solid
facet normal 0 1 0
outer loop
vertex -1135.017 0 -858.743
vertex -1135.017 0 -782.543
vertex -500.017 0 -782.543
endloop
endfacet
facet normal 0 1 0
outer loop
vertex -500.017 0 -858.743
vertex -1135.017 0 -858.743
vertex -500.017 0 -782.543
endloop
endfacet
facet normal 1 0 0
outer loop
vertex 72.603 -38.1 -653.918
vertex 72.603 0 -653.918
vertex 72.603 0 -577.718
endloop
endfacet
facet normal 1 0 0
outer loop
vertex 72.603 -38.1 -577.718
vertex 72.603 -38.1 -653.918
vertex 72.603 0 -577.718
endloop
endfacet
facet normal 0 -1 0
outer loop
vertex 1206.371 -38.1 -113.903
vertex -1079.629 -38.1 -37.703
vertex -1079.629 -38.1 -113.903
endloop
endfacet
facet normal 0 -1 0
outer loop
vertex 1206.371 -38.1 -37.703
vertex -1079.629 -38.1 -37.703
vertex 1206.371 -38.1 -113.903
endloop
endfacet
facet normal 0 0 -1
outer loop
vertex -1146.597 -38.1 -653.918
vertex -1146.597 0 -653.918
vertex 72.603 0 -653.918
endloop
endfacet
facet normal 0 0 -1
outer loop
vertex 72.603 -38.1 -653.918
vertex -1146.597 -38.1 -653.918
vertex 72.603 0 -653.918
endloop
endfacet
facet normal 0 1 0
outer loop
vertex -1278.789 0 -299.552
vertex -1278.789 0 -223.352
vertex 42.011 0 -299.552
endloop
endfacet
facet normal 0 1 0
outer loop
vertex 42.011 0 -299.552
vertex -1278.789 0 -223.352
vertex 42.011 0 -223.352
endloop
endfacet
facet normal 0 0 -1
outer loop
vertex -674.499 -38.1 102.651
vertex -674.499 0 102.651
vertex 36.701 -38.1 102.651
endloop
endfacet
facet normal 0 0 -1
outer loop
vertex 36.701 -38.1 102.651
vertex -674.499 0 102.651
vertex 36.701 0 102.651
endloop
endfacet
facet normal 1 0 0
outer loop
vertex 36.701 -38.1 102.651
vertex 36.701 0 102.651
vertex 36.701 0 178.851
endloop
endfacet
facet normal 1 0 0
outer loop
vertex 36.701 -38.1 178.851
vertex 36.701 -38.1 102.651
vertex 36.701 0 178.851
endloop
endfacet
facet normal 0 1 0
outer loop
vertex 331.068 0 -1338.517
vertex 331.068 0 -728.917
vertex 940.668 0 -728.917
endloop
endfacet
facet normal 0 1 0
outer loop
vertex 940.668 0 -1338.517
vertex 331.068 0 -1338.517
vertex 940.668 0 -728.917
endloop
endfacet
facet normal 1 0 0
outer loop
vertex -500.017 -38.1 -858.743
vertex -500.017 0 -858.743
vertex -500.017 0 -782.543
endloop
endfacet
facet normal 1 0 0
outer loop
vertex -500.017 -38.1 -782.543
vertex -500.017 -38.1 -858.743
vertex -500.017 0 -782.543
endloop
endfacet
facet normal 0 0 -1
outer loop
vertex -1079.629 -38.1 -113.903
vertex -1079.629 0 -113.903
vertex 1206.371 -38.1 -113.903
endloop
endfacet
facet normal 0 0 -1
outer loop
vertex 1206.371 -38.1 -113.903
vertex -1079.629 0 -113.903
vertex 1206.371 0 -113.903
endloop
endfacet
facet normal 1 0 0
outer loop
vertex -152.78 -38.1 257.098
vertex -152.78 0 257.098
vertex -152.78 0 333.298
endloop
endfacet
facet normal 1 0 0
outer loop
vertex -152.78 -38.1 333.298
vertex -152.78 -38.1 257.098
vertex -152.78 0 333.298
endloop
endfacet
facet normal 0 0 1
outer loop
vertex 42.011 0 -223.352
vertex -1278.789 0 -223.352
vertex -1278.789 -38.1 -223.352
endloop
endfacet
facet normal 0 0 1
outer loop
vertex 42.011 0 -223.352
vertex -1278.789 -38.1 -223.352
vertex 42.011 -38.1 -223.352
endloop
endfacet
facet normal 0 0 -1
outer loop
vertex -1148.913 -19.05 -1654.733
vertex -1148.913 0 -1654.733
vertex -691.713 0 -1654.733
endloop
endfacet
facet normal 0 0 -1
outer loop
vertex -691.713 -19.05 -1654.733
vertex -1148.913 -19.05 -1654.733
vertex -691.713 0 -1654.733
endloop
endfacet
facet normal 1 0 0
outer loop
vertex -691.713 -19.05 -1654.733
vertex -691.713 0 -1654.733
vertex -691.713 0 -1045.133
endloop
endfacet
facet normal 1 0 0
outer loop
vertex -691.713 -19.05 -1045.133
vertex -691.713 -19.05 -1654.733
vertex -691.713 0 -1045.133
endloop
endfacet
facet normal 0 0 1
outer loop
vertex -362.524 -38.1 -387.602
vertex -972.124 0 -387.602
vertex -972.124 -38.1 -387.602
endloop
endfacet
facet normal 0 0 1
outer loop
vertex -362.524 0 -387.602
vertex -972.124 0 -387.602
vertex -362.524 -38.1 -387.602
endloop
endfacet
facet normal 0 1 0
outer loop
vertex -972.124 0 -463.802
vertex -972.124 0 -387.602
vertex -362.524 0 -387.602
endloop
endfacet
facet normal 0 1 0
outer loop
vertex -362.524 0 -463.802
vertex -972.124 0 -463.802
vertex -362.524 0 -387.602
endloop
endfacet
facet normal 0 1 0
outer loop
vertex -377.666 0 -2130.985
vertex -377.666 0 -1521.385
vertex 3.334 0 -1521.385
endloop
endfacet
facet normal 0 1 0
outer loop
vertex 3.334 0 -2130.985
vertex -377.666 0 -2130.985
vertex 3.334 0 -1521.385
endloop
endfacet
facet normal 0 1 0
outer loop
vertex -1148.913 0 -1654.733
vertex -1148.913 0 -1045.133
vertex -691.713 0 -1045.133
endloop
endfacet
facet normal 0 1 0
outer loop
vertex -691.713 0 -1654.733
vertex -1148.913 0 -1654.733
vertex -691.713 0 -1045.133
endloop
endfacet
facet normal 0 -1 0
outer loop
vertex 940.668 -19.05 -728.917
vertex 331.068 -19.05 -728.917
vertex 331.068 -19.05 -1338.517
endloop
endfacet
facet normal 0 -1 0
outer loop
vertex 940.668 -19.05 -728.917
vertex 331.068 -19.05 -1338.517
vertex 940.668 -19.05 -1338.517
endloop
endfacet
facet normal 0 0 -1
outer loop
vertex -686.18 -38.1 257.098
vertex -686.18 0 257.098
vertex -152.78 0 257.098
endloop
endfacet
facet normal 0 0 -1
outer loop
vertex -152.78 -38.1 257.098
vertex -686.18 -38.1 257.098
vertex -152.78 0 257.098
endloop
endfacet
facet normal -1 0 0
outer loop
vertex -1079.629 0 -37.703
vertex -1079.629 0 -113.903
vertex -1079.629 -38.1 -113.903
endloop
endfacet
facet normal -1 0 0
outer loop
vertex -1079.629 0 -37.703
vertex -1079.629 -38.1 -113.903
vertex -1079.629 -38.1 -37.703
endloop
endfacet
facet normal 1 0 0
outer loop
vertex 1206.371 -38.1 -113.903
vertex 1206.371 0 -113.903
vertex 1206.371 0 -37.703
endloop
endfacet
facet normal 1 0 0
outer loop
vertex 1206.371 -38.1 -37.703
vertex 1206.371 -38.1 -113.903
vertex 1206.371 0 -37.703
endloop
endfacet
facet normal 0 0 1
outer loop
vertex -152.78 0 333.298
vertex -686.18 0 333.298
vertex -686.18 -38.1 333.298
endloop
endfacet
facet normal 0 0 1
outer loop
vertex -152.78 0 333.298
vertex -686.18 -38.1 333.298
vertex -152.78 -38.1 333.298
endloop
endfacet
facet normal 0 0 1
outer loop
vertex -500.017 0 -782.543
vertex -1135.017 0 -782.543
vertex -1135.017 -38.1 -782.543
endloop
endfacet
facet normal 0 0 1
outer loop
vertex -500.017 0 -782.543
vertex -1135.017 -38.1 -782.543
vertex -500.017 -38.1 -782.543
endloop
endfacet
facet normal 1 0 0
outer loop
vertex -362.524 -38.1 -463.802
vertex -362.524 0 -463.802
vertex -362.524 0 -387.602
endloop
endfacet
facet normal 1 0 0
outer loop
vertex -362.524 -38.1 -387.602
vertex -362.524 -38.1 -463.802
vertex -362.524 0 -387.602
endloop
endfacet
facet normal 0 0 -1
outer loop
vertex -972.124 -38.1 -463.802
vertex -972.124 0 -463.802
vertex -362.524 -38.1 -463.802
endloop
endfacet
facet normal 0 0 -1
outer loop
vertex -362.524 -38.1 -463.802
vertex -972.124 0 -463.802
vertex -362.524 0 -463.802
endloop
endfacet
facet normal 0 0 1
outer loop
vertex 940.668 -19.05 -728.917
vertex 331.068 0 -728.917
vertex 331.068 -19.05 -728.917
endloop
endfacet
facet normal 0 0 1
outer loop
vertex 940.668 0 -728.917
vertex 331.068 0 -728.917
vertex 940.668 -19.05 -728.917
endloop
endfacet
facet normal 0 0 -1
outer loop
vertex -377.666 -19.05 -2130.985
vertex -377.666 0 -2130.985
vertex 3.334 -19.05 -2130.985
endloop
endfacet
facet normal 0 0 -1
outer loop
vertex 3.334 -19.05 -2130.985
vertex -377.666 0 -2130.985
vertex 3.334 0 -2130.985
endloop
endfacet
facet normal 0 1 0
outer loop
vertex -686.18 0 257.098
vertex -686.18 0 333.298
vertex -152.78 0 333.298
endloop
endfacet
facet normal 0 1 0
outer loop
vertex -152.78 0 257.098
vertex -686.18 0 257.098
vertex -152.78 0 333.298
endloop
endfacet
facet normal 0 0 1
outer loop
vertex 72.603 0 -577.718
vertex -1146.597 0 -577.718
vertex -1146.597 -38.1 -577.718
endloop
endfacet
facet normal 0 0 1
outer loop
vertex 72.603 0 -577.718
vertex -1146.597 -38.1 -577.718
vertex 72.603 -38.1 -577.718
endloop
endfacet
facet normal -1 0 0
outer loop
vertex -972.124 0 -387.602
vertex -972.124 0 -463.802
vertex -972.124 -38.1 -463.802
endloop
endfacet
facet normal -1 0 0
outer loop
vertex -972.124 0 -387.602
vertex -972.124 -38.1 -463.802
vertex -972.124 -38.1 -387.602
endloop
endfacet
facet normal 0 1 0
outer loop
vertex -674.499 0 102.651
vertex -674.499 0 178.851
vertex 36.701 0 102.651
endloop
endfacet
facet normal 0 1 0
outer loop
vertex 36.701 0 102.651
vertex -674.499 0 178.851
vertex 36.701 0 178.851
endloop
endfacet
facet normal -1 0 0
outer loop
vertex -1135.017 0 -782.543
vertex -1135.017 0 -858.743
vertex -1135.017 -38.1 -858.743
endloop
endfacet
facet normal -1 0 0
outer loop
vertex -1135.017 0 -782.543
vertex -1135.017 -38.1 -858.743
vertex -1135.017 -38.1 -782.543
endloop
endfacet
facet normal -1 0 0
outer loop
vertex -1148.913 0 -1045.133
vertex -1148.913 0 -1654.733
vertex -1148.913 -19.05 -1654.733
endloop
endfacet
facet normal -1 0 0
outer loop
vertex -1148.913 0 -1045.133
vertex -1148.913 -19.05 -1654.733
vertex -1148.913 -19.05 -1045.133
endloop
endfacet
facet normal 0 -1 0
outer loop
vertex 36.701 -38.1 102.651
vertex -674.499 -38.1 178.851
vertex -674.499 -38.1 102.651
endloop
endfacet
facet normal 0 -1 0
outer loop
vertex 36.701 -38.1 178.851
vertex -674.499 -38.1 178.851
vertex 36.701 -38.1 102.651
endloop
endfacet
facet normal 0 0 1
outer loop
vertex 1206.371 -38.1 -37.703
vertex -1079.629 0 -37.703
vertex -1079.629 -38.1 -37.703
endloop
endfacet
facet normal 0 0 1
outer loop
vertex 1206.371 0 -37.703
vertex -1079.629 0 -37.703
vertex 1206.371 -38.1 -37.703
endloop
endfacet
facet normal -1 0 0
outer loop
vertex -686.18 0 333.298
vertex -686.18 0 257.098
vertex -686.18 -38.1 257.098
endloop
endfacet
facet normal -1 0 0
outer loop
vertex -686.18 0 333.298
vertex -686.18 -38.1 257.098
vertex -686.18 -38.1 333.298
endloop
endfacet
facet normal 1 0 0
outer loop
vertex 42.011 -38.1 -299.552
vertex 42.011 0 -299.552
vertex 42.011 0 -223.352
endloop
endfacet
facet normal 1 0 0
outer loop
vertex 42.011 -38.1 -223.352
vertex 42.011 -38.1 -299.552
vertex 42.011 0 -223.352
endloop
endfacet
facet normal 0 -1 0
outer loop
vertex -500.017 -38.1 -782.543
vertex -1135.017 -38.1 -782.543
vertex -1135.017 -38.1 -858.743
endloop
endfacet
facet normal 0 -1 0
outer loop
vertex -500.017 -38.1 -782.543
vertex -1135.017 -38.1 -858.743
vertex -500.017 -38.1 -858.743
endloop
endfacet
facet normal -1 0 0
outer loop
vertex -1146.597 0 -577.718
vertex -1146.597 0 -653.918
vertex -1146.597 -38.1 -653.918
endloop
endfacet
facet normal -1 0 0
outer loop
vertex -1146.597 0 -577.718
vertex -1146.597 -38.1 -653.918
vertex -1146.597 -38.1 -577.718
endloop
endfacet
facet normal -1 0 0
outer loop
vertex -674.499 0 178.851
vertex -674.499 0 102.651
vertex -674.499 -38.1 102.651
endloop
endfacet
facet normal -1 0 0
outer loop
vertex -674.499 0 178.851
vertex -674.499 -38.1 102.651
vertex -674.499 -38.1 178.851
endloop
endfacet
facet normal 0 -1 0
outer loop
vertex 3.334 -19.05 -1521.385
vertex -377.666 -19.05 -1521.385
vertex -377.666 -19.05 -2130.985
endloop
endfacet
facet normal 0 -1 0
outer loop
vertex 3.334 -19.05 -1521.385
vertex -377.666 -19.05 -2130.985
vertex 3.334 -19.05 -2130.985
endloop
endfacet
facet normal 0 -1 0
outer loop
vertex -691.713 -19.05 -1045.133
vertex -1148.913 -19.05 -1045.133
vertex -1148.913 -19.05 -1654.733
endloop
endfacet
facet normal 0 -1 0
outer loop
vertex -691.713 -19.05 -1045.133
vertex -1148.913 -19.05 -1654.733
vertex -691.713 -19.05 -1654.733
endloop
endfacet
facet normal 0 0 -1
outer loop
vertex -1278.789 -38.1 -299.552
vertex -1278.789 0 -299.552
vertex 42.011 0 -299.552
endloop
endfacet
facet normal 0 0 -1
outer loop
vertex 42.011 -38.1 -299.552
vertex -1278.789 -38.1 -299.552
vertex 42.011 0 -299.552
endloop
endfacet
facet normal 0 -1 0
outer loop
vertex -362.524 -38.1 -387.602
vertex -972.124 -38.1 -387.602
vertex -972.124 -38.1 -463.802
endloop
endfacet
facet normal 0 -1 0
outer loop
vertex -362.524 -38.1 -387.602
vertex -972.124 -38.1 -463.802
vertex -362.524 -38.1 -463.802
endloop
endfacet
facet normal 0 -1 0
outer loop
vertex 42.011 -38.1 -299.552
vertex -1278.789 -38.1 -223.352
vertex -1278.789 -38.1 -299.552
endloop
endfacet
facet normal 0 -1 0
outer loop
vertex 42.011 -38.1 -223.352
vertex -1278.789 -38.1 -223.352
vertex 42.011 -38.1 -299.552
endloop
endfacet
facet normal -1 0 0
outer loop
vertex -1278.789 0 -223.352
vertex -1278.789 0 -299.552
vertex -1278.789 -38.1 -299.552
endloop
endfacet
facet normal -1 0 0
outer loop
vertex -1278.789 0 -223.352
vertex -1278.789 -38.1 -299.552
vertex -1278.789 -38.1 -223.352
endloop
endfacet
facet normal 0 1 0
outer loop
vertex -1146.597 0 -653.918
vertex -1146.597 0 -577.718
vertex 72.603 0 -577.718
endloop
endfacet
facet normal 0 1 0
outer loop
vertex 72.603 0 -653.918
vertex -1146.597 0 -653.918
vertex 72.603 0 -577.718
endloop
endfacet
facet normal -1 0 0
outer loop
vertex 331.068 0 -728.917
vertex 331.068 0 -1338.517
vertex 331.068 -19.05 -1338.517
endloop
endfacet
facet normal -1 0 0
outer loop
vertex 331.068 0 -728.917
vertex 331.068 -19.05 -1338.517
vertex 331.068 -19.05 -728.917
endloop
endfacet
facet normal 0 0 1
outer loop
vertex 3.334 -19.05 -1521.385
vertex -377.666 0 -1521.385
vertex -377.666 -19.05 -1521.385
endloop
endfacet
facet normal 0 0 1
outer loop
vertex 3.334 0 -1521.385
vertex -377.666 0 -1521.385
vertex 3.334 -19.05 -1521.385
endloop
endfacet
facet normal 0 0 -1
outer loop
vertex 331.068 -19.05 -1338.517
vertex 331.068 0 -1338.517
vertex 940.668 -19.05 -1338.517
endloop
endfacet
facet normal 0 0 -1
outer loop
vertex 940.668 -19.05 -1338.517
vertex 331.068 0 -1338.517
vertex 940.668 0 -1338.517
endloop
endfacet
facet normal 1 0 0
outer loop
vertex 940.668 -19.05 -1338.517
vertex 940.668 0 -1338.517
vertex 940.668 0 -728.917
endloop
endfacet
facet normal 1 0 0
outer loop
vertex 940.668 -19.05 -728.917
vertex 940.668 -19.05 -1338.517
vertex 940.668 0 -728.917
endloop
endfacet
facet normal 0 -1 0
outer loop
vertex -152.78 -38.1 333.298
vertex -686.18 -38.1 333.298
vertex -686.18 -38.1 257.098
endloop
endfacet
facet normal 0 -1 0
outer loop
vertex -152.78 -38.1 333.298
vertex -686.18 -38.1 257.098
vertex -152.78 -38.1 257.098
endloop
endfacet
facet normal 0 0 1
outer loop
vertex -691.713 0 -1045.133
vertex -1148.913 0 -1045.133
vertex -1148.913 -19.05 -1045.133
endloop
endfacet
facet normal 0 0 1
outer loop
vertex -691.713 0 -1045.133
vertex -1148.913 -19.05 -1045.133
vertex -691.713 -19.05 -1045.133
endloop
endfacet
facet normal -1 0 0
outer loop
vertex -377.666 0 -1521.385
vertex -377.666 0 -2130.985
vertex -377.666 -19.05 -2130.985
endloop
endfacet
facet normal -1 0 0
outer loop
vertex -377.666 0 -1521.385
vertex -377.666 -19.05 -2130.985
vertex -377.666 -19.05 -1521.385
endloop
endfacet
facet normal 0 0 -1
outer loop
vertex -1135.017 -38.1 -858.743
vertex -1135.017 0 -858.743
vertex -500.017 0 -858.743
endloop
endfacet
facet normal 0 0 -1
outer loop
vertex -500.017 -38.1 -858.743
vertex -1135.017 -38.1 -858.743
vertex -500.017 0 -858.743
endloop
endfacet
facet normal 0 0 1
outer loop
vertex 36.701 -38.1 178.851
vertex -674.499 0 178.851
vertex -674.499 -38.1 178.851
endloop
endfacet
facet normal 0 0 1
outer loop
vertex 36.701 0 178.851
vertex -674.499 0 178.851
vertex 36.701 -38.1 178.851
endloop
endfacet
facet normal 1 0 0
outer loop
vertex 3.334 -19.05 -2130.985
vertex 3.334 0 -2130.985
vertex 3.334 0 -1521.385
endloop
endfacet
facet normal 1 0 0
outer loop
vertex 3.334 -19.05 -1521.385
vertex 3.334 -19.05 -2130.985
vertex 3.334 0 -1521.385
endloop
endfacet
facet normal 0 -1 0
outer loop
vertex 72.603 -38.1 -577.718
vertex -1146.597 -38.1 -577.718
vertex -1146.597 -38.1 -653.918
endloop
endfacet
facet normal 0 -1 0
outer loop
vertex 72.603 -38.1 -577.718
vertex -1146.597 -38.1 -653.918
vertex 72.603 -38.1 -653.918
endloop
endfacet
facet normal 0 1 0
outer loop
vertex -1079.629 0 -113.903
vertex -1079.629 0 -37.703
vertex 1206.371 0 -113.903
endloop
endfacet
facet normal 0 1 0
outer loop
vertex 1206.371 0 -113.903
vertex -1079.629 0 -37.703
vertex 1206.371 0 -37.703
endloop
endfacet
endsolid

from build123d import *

# Parameters (mm, degrees)
F0_W      = 2286
F0_H      = 76.2
F1_DEPTH  = 38.1
F2_W      = 533.4
F2_H      = 76.2
F3_DEPTH  = 38.1
F4_W      = 711.2
F4_H      = 76.2
F5_DEPTH  = 38.1
F6_W      = 1320.8
F6_H      = 76.2
F7_DEPTH  = 38.1
F8_W      = 533.4
F8_H      = 76.2
F9_DEPTH  = 38.1
F10_W     = 1219.2
F10_H     = 76.2
F11_DEPTH = 38.1
F13_W     = 609.6
F13_H     = 76.2
F14_DEPTH = 38.1
F15_W     = 635
F15_H     = 76.2
F16_DEPTH = 38.1
F17_W     = 609.6
F17_H     = 609.6
F18_DEPTH = 19.05
F19_W     = 457.2
F19_H     = 609.6
F20_DEPTH = 19.05
F21_W     = 381
F21_H     = 609.6
F22_DEPTH = 19.05


with BuildPart() as f1:
    # F0 (on Front) → F1 (new body)
    with BuildSketch(Plane.XZ):
        with Locations((63.37081, -75.803273)):
            Rectangle(F0_W, F0_H)
    extrude(amount=F1_DEPTH)


with BuildPart() as f3:
    # F2 (on Front) → F3 (new body)
    with BuildSketch(Plane.XZ):
        with Locations((-419.480242, 295.197657)):
            Rectangle(F2_W, F2_H)
    extrude(amount=F3_DEPTH)


with BuildPart() as f5:
    # F4 (on Front) → F5 (new body)
    with BuildSketch(Plane.XZ):
        with Locations((-318.899173, 140.750785)):
            Rectangle(F4_W, F4_H)
    extrude(amount=F5_DEPTH)


with BuildPart() as f7:
    # F6 (on Front) → F7 (new body)
    with BuildSketch(Plane.XZ):
        with Locations((-618.389063, -261.451548)):
            Rectangle(F6_W, F6_H)
    extrude(amount=F7_DEPTH)


with BuildPart() as f9:
    # F8 (on Front) → F9 (new body)
    with BuildSketch(Plane.XZ):
        with Locations((-266.7, -385.047625)):
            Rectangle(F8_W, F8_H)
    extrude(amount=F9_DEPTH)


with BuildPart() as f11:
    # F10 (on Front) → F11 (new body)
    with BuildSketch(Plane.XZ):
        with Locations((-536.997348, -615.818064)):
            Rectangle(F10_W, F10_H)
    extrude(amount=F11_DEPTH)


with BuildPart() as f14:
    # F13 (on Front) → F14 (new body)
    with BuildSketch(Plane.XZ):
        with Locations((-667.324111, -425.702255)):
            Rectangle(F13_W, F13_H)
    extrude(amount=F14_DEPTH)


with BuildPart() as f16:
    # F15 (on Front) → F16 (new body)
    with BuildSketch(Plane.XZ):
        with Locations((-817.517385, -820.643223)):
            Rectangle(F15_W, F15_H)
    extrude(amount=F16_DEPTH)


with BuildPart() as f18:
    # F17 (on Front) → F18 (new body)
    with BuildSketch(Plane.XZ):
        with Locations((635.8677, -1033.717296)):
            Rectangle(F17_W, F17_H)
    extrude(amount=F18_DEPTH)


with BuildPart() as f20:
    # F19 (on Front) → F20 (new body)
    with BuildSketch(Plane.XZ):
        with Locations((-920.312621, -1349.933445)):
            Rectangle(F19_W, F19_H)
    extrude(amount=F20_DEPTH)


with BuildPart() as f22:
    # F21 (on Front) → F22 (new body)
    with BuildSketch(Plane.XZ):
        with Locations((-187.16579, -1826.184869)):
            Rectangle(F21_W, F21_H)
    extrude(amount=F22_DEPTH)


solid = Compound([f1.part, f3.part, f5.part, f7.part, f11.part, f14.part, f16.part, f18.part, f20.part, f22.part])
